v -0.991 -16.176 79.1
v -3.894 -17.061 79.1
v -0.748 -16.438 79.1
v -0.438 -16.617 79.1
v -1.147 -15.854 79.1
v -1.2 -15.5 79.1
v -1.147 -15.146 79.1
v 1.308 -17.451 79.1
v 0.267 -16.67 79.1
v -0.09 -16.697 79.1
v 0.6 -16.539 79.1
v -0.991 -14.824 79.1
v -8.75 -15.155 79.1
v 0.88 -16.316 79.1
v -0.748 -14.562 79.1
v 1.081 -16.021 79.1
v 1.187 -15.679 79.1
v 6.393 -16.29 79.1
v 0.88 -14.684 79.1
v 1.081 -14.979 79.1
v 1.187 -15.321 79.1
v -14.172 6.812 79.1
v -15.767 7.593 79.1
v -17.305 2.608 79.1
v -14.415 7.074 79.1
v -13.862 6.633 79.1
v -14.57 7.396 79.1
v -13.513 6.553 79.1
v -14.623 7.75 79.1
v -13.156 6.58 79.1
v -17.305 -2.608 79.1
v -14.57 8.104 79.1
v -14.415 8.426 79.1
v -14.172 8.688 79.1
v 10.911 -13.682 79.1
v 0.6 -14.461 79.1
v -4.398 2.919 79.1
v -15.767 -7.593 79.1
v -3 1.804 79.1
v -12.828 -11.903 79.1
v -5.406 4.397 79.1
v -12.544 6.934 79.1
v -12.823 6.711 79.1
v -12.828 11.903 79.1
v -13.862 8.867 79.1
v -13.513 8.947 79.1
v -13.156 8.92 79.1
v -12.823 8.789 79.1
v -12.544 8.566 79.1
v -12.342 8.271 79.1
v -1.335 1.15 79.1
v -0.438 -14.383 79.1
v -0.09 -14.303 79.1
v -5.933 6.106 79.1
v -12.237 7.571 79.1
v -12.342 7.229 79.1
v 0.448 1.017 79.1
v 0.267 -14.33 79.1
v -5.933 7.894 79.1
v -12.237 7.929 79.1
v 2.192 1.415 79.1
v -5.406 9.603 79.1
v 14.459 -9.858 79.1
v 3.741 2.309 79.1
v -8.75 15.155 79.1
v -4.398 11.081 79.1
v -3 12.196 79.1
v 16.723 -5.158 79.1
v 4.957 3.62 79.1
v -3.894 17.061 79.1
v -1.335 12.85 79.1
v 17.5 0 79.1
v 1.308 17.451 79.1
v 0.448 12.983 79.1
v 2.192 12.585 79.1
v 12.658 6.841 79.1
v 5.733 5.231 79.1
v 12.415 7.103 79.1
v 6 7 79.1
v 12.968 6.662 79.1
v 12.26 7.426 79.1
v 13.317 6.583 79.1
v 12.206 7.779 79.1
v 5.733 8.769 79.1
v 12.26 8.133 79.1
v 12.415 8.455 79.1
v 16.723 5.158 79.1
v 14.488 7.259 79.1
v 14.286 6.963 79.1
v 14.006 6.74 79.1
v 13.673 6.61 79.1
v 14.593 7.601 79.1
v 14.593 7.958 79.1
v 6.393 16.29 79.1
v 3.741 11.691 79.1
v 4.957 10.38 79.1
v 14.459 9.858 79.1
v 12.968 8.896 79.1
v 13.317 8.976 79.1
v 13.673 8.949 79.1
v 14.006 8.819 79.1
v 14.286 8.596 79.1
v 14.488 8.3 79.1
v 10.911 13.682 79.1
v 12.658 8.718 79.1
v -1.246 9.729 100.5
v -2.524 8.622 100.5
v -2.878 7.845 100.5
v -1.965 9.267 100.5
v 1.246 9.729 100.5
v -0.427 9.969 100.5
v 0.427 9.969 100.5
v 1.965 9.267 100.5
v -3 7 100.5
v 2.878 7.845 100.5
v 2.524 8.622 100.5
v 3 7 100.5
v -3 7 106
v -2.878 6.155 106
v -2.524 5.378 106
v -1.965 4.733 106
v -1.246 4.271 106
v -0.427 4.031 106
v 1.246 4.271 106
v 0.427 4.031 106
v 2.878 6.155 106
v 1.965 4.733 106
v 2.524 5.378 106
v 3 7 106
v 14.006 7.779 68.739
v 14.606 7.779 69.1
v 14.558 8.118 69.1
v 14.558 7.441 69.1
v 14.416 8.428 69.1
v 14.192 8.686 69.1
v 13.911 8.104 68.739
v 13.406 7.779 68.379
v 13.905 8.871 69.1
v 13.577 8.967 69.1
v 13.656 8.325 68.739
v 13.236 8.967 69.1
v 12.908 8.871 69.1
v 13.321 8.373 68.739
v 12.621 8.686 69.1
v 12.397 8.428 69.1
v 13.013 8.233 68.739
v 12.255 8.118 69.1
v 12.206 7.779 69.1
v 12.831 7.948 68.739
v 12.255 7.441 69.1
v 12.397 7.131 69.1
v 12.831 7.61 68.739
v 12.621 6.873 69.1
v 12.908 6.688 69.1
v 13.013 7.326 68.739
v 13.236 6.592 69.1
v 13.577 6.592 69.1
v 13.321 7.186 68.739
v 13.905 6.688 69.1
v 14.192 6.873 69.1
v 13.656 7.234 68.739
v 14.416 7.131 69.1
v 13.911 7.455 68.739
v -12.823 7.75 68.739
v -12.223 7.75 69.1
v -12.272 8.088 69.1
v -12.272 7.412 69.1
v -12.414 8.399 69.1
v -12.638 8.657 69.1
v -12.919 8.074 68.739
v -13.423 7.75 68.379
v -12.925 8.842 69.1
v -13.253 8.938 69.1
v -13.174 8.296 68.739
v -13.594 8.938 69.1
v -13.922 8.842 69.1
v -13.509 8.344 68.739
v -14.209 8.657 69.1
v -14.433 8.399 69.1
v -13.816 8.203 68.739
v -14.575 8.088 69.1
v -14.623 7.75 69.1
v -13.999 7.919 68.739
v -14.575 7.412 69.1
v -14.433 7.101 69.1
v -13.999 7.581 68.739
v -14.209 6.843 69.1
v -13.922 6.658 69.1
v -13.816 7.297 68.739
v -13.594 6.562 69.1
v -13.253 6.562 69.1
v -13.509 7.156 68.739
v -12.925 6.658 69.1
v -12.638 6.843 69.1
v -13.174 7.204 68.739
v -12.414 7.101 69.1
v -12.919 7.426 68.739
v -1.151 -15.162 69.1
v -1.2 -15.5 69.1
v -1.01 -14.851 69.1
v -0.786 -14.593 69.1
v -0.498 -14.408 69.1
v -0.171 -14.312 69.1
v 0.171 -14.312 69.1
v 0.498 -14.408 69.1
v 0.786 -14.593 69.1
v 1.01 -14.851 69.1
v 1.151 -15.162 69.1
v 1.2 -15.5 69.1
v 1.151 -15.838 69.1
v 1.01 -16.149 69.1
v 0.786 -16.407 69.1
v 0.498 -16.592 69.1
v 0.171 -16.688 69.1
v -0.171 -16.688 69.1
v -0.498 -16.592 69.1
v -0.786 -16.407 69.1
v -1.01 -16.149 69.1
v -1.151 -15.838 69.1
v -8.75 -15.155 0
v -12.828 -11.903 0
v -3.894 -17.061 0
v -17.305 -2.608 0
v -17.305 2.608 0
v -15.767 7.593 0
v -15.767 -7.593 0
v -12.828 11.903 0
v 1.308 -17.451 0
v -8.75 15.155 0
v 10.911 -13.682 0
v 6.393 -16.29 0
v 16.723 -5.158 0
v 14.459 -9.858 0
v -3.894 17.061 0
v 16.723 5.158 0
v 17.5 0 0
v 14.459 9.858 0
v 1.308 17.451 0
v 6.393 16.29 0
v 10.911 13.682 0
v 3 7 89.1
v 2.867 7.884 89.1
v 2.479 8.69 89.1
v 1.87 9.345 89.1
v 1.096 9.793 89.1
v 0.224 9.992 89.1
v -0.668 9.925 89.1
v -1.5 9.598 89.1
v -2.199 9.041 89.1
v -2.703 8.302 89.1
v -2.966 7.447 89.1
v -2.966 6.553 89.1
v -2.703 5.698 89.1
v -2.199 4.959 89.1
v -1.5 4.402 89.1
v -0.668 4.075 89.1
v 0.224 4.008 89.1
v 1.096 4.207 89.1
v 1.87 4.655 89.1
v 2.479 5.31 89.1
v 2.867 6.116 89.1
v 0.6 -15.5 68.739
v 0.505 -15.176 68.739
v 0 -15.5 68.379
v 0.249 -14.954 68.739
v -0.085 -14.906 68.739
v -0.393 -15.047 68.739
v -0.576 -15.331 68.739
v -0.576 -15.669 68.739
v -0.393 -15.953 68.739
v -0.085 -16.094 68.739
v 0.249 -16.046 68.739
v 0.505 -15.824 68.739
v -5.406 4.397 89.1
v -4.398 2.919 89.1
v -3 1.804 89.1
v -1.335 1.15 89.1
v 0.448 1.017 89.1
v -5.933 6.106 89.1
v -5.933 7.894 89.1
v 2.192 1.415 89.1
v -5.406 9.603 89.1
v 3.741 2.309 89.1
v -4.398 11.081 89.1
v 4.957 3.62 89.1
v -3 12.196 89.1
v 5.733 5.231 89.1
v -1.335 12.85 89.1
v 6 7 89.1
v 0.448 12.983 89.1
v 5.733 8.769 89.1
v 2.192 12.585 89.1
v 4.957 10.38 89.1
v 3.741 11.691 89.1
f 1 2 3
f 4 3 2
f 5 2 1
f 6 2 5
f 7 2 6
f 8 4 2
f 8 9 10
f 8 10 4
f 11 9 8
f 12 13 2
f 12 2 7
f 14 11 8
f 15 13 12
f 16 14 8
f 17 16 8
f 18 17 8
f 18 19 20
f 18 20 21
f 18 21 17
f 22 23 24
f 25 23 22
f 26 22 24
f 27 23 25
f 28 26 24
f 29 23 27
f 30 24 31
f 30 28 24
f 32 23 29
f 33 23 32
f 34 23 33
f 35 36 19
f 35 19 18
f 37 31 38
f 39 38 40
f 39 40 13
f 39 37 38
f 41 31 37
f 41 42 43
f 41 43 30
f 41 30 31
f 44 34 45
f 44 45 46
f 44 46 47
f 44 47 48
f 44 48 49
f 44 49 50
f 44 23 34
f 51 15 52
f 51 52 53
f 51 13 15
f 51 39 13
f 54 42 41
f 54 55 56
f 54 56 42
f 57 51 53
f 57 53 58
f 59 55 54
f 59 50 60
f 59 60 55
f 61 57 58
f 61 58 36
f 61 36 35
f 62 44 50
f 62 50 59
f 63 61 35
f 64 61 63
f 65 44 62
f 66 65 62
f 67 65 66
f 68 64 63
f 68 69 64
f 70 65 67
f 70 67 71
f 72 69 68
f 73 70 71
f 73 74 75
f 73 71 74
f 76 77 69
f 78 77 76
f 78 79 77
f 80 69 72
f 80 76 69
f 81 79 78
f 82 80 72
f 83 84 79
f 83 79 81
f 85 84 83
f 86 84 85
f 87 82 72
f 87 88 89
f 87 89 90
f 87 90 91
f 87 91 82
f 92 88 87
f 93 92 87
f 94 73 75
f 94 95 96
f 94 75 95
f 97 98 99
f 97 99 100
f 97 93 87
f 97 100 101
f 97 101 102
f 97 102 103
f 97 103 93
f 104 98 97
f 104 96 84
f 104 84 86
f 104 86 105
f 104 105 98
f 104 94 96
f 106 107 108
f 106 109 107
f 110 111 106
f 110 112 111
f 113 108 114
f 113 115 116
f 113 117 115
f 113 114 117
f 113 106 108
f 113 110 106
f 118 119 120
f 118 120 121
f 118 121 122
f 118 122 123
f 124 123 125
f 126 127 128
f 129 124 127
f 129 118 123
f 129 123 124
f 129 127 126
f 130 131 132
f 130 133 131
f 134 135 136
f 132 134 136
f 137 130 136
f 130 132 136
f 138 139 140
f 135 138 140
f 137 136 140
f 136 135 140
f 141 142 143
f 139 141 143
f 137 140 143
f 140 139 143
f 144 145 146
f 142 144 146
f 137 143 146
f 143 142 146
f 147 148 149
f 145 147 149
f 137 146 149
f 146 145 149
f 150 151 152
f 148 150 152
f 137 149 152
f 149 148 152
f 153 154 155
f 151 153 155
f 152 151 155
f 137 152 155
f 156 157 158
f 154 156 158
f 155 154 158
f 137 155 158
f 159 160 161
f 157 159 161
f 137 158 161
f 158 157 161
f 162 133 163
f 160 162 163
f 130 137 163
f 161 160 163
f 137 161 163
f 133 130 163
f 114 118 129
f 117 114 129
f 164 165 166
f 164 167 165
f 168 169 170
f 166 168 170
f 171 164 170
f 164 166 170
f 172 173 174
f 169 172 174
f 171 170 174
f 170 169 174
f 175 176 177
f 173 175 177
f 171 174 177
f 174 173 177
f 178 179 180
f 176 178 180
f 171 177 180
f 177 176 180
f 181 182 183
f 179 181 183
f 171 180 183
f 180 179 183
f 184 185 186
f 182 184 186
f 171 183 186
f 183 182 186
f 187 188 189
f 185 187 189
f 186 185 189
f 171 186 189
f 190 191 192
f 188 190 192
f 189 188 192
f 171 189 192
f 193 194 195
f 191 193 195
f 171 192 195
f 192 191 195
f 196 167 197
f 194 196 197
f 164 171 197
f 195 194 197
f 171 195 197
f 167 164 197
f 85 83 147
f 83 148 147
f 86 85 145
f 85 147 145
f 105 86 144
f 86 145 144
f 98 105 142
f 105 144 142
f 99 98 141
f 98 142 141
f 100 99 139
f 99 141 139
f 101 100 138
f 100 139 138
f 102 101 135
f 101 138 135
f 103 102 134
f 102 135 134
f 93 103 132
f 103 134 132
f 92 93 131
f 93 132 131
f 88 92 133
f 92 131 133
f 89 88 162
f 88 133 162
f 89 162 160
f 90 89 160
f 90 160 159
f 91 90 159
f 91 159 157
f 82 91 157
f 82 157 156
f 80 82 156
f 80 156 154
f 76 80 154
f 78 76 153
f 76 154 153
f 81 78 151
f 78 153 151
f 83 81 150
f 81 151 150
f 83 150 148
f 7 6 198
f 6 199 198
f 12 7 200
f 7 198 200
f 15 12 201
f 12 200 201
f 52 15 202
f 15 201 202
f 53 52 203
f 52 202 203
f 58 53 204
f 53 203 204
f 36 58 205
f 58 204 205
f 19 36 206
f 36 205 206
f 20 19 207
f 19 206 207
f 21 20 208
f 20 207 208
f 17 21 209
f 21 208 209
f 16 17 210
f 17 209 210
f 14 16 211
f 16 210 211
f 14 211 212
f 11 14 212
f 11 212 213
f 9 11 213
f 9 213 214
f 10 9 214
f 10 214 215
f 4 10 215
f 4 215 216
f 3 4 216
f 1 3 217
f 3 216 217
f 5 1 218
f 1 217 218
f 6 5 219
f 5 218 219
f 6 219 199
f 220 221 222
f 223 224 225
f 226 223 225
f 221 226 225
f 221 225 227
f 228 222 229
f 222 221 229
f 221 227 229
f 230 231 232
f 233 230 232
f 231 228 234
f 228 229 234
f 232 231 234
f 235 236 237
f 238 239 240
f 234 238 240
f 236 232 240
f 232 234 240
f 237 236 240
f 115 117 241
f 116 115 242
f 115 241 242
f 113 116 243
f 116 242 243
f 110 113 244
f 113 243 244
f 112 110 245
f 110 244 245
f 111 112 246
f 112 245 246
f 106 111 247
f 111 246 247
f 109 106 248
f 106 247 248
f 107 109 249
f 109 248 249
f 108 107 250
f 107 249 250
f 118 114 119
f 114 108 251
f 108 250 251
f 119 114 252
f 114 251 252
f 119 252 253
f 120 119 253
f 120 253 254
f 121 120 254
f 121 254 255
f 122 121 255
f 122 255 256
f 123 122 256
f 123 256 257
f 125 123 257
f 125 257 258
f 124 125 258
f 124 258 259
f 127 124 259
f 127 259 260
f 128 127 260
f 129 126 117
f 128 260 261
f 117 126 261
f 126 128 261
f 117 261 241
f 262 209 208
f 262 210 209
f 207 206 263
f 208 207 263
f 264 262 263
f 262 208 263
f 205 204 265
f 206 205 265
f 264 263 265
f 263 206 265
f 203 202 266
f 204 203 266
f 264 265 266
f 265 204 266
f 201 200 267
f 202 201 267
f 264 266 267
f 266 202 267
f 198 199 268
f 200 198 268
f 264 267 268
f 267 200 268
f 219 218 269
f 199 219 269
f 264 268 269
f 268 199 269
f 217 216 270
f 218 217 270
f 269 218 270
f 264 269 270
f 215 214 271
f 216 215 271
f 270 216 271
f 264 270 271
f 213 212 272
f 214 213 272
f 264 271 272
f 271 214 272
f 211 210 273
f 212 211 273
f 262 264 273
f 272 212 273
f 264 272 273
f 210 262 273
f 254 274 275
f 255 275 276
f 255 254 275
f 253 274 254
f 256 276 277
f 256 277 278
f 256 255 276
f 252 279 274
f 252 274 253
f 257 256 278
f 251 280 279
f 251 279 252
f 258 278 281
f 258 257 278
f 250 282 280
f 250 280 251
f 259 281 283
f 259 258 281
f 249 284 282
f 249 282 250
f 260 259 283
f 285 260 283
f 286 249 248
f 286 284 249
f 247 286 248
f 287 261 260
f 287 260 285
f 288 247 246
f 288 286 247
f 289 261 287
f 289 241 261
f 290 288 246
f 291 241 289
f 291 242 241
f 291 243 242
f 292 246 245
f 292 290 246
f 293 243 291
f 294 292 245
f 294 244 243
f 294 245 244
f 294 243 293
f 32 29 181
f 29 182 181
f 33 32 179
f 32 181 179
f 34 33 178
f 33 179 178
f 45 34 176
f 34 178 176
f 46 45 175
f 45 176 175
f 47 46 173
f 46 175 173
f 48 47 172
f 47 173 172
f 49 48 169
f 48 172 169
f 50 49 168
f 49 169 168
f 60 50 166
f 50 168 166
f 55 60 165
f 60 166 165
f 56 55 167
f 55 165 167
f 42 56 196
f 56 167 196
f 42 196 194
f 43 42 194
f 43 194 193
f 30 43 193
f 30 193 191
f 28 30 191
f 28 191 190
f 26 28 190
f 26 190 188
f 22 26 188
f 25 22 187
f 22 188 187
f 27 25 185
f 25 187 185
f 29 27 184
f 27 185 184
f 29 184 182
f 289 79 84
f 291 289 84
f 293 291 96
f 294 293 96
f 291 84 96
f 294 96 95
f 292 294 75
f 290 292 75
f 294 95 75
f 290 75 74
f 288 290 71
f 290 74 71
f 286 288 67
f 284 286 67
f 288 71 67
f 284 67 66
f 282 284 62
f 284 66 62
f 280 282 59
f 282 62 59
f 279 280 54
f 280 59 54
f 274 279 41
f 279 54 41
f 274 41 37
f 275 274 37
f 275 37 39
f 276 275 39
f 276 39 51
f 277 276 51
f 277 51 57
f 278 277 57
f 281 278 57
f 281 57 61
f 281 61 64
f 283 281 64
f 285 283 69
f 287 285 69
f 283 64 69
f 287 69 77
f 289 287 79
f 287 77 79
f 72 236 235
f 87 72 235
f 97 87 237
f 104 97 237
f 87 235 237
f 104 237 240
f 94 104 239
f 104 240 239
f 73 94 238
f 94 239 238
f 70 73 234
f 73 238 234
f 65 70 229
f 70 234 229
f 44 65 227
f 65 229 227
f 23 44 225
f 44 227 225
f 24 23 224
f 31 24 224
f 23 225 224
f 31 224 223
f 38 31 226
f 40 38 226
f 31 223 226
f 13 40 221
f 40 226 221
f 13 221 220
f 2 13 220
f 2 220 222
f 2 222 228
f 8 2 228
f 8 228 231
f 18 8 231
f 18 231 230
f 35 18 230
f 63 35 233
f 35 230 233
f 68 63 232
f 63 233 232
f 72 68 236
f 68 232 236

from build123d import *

# Parameters (mm, degrees)
ESQUISSE1_R             = 17.5
BOSS_EXTRU_1_DEPTH      = 79.1
ESQUISSE2_R             = 6
BOSS_EXTRU_2_DEPTH      = 10
ESQUISSE3_R             = 3
BOSS_EXTRU_3_DEPTH      = 16.9
ESQUISSE4_W             = 6
ESQUISSE4_H             = 3
ENL_V_MAT_EXTRU_1_DEPTH = 5.5
D_GAGEMENT_M24_D        = 2.4
D_GAGEMENT_M24_DEPTH    = 10
D_GAGEMENT_M24_TIP      = 0.721032743


with BuildPart() as part:
    # Esquisse1 → Boss.-Extru.1 (new body)
    with BuildSketch(Plane.XY):
        Circle(ESQUISSE1_R)
    extrude(amount=BOSS_EXTRU_1_DEPTH)

    # Esquisse2 → Boss.-Extru.2 (add)
    with BuildSketch(Plane.XY.offset(79.1)):
        with Locations((0, 7)):
            Circle(ESQUISSE2_R)
    extrude(amount=BOSS_EXTRU_2_DEPTH)

    # Esquisse3 → Boss.-Extru.3 (add)
    with BuildSketch(Plane.XY.offset(89.1)):
        with Locations((0, 7)):
            Circle(ESQUISSE3_R)
    extrude(amount=BOSS_EXTRU_3_DEPTH)

    # Esquisse4 → Enlèv. mat.-Extru.1 (cut)
    with BuildSketch(Plane.XY.offset(106)):
        with Locations((0, 8.5)):
            Rectangle(ESQUISSE4_W, ESQUISSE4_H)
    extrude(amount=-ENL_V_MAT_EXTRU_1_DEPTH, mode=Mode.SUBTRACT)

    # Dégagement M24
    with Locations(Plane(origin=(13.40635523, 7.779436963, 79.1), x_dir=(1, 0, 0), z_dir=(0, 0, 1))):
        with Locations((0, 0), (-13.40635523, -23.279436963), (-26.829748989, -0.029436963)):
            Hole(D_GAGEMENT_M24_D / 2, depth=D_GAGEMENT_M24_DEPTH)
            with Locations((0, 0, -(D_GAGEMENT_M24_DEPTH + D_GAGEMENT_M24_TIP / 2))):  # 118° drill point
                Cone(0, D_GAGEMENT_M24_D / 2, D_GAGEMENT_M24_TIP, mode=Mode.SUBTRACT)


solid = part.part
